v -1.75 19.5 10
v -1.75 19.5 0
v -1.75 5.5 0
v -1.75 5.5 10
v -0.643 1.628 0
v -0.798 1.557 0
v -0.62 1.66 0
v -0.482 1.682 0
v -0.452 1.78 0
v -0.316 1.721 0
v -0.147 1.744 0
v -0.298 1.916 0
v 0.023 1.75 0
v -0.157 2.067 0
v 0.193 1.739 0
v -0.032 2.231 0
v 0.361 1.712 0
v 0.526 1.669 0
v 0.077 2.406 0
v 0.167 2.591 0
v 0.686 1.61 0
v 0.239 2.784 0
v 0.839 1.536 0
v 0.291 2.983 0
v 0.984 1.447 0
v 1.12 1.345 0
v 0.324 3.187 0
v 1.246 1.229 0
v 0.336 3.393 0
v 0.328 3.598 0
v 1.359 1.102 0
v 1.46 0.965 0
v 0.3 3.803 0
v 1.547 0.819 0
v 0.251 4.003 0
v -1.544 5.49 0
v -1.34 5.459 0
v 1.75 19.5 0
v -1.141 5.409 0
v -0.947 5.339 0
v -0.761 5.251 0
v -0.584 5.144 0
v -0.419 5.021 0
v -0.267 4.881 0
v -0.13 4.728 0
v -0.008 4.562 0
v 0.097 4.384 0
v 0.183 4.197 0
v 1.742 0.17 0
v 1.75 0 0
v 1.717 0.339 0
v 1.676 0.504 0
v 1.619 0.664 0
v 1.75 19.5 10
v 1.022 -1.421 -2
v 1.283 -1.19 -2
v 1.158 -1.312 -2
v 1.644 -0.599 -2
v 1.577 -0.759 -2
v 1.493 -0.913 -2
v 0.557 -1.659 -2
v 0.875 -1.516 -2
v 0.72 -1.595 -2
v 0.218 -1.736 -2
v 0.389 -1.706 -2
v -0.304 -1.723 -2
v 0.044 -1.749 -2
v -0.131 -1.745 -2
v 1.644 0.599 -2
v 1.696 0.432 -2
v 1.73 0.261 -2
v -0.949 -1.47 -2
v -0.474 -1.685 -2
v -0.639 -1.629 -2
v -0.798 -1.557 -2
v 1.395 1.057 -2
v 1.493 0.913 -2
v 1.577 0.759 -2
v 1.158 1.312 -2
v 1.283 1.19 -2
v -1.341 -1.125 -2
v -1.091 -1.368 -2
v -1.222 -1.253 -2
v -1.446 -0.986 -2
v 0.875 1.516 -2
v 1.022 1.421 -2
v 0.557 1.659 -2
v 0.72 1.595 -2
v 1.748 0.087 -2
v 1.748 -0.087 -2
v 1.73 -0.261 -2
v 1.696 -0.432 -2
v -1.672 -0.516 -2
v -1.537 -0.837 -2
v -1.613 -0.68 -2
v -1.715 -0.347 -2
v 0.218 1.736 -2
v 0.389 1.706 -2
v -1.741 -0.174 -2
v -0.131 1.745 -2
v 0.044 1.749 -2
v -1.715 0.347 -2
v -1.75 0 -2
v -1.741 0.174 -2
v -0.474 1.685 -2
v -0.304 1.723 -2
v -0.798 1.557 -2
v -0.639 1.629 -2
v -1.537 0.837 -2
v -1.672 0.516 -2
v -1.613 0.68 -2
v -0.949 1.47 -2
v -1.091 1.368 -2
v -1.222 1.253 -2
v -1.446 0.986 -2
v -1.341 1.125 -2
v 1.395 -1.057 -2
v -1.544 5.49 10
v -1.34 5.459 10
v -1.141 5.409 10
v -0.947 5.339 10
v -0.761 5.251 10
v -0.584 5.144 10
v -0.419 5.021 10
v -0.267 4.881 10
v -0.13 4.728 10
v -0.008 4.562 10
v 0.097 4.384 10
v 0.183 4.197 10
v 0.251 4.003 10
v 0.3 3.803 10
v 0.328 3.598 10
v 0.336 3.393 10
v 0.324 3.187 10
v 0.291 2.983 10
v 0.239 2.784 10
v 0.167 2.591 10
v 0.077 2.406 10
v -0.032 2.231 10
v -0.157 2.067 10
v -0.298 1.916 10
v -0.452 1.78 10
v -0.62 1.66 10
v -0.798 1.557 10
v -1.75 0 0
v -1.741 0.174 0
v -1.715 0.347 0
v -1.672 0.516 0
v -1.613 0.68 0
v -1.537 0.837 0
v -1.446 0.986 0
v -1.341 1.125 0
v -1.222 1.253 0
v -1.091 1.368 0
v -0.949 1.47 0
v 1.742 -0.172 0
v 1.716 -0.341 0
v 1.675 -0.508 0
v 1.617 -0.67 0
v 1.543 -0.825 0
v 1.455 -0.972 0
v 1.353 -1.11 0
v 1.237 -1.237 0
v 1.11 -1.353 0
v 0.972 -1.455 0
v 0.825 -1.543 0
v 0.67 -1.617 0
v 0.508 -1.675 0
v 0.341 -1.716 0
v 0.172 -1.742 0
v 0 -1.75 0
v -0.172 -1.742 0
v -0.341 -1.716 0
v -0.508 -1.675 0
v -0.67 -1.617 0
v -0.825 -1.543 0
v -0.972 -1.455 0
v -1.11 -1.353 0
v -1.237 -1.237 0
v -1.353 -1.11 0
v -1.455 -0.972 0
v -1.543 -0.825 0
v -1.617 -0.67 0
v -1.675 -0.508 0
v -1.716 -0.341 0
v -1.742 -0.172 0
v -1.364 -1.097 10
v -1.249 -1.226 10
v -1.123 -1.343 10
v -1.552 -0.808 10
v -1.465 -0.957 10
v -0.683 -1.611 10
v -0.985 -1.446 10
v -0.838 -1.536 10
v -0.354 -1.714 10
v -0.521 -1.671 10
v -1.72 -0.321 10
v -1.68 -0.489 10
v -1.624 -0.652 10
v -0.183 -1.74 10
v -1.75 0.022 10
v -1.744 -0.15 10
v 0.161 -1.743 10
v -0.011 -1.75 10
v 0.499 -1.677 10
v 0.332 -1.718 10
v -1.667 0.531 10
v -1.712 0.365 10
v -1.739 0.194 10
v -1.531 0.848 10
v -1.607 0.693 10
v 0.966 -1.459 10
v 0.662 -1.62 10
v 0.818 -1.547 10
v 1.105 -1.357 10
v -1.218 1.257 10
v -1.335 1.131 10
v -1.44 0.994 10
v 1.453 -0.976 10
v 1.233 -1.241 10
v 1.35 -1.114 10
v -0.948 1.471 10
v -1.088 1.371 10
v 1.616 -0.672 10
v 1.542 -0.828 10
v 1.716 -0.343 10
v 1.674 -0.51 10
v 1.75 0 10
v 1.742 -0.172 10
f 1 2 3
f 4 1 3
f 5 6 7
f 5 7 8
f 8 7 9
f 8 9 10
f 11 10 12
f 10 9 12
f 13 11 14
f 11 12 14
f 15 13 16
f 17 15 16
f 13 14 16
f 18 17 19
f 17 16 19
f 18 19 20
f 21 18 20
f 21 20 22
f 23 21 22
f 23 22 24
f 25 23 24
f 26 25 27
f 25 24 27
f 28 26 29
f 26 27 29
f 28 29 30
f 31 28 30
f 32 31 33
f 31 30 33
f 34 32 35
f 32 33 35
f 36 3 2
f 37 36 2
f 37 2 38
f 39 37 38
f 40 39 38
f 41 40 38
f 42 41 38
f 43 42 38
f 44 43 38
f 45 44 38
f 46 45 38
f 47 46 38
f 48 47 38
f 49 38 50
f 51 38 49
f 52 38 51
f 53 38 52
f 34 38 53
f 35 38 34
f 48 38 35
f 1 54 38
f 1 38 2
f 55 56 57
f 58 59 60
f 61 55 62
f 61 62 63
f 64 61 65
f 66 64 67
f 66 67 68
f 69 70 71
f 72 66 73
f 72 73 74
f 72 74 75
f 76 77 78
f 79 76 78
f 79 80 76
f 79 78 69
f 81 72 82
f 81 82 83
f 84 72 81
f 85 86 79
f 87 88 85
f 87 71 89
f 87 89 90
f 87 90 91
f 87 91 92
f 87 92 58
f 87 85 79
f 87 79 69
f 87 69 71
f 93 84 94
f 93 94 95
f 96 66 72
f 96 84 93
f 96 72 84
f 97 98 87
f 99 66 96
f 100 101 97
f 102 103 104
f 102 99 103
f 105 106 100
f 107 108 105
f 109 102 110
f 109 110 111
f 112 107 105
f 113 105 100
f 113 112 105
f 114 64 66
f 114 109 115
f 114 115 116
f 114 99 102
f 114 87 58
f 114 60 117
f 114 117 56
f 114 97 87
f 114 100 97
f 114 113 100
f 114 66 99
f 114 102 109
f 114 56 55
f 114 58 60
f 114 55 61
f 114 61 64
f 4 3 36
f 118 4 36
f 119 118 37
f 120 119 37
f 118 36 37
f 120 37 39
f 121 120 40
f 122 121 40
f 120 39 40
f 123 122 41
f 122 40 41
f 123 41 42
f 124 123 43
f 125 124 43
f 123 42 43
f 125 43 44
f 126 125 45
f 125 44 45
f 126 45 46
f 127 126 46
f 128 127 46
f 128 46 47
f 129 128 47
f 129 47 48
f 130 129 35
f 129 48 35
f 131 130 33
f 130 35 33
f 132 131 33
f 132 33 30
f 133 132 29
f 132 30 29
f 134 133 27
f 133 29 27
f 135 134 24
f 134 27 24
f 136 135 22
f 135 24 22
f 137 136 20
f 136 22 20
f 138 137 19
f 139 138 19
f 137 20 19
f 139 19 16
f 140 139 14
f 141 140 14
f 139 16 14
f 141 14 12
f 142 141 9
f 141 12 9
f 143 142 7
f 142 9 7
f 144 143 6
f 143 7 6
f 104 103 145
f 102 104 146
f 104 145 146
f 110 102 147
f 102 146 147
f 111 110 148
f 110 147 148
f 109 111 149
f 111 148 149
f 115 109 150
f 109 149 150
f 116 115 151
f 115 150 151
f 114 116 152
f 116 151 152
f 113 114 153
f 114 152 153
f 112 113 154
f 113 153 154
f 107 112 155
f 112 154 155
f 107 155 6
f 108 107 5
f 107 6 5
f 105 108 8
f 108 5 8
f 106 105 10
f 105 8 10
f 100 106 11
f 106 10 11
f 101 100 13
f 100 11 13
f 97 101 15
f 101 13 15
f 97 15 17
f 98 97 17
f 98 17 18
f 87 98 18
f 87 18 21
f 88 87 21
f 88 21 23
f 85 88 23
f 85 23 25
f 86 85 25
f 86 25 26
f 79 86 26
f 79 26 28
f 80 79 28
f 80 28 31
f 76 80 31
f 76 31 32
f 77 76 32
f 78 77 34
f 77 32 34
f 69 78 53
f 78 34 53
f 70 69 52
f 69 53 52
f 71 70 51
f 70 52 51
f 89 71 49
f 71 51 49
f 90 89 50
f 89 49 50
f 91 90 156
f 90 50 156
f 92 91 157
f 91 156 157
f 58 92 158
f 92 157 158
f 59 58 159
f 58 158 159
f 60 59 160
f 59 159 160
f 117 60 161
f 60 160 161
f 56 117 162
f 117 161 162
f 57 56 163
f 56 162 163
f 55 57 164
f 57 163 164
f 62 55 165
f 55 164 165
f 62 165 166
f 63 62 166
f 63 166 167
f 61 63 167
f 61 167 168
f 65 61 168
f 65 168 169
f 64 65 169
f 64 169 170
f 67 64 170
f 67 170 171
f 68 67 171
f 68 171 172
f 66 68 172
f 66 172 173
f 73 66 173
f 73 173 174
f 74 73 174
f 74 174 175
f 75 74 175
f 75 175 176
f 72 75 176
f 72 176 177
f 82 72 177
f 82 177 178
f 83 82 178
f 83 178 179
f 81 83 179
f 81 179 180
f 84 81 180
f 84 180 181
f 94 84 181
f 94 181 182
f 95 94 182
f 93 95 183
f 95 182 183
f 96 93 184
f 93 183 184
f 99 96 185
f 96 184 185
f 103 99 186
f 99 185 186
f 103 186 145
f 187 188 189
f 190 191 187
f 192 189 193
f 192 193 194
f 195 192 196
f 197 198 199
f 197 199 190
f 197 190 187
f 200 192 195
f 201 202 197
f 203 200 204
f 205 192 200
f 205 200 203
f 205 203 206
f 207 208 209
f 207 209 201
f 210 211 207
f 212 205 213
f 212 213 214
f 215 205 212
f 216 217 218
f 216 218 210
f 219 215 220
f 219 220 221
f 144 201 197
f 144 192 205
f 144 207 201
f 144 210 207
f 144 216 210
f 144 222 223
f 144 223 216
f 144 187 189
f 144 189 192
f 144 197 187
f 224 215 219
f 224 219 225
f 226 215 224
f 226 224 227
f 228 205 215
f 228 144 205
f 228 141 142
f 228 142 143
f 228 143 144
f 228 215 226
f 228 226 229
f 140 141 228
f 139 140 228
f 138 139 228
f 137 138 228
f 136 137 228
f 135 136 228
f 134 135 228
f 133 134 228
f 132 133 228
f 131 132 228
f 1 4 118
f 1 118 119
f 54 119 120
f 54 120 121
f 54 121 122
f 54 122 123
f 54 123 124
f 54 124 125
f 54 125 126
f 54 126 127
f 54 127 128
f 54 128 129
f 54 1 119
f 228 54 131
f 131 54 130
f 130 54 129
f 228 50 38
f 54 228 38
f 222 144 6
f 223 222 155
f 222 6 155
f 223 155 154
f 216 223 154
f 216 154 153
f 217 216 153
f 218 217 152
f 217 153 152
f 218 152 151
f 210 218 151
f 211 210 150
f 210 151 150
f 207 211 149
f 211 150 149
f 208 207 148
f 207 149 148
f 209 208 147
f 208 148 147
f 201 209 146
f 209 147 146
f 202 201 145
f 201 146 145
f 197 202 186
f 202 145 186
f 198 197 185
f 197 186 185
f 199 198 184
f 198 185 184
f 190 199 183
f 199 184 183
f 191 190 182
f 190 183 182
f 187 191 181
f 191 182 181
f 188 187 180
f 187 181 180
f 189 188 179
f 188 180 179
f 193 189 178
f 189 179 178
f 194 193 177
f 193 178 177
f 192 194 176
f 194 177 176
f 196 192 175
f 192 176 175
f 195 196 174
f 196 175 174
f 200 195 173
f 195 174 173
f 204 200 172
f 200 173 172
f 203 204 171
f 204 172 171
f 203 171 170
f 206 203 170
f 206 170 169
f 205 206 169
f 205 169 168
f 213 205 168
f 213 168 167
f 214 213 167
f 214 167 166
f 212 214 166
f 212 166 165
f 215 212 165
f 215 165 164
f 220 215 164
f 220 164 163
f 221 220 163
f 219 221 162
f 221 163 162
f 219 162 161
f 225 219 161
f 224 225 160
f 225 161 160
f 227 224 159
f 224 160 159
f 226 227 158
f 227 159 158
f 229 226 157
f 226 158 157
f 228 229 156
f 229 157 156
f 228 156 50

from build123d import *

# Parameters (mm, degrees)
DODANIE_WYCI_GNI_CIE1_DEPTH = 10
SZKIC2_R                    = 1.75
DODANIE_WYCI_GNI_CIE2_DEPTH = 2


with BuildPart() as part:
    # Szkic1 → Dodanie-wyciągnięcie1 (new body)
    with BuildSketch(Plane.XY):
        with BuildLine():
            Line((1.75, 0), (1.75, 19.5))
            Line((1.75, 19.5), (-1.75, 19.5))
            Line((-1.75, 19.5), (-1.75, 5.5))
            ThreePointArc((-1.75, 5.5), (0.277964608, 3.903301802), (-0.798314607, 1.557303371))
            ThreePointArc((-0.798314607, 1.557303371), (-0.912537517, -1.493243209), (1.75, 0))
        make_face()
    extrude(amount=DODANIE_WYCI_GNI_CIE1_DEPTH)

    # Szkic2 → Dodanie-wyciągnięcie2 (add)
    with BuildSketch(Plane(origin=(0, 0, 0), x_dir=(-1, 0, 0), z_dir=(0, 0, -1))):
        Circle(SZKIC2_R)
    extrude(amount=DODANIE_WYCI_GNI_CIE2_DEPTH)


solid = part.part
